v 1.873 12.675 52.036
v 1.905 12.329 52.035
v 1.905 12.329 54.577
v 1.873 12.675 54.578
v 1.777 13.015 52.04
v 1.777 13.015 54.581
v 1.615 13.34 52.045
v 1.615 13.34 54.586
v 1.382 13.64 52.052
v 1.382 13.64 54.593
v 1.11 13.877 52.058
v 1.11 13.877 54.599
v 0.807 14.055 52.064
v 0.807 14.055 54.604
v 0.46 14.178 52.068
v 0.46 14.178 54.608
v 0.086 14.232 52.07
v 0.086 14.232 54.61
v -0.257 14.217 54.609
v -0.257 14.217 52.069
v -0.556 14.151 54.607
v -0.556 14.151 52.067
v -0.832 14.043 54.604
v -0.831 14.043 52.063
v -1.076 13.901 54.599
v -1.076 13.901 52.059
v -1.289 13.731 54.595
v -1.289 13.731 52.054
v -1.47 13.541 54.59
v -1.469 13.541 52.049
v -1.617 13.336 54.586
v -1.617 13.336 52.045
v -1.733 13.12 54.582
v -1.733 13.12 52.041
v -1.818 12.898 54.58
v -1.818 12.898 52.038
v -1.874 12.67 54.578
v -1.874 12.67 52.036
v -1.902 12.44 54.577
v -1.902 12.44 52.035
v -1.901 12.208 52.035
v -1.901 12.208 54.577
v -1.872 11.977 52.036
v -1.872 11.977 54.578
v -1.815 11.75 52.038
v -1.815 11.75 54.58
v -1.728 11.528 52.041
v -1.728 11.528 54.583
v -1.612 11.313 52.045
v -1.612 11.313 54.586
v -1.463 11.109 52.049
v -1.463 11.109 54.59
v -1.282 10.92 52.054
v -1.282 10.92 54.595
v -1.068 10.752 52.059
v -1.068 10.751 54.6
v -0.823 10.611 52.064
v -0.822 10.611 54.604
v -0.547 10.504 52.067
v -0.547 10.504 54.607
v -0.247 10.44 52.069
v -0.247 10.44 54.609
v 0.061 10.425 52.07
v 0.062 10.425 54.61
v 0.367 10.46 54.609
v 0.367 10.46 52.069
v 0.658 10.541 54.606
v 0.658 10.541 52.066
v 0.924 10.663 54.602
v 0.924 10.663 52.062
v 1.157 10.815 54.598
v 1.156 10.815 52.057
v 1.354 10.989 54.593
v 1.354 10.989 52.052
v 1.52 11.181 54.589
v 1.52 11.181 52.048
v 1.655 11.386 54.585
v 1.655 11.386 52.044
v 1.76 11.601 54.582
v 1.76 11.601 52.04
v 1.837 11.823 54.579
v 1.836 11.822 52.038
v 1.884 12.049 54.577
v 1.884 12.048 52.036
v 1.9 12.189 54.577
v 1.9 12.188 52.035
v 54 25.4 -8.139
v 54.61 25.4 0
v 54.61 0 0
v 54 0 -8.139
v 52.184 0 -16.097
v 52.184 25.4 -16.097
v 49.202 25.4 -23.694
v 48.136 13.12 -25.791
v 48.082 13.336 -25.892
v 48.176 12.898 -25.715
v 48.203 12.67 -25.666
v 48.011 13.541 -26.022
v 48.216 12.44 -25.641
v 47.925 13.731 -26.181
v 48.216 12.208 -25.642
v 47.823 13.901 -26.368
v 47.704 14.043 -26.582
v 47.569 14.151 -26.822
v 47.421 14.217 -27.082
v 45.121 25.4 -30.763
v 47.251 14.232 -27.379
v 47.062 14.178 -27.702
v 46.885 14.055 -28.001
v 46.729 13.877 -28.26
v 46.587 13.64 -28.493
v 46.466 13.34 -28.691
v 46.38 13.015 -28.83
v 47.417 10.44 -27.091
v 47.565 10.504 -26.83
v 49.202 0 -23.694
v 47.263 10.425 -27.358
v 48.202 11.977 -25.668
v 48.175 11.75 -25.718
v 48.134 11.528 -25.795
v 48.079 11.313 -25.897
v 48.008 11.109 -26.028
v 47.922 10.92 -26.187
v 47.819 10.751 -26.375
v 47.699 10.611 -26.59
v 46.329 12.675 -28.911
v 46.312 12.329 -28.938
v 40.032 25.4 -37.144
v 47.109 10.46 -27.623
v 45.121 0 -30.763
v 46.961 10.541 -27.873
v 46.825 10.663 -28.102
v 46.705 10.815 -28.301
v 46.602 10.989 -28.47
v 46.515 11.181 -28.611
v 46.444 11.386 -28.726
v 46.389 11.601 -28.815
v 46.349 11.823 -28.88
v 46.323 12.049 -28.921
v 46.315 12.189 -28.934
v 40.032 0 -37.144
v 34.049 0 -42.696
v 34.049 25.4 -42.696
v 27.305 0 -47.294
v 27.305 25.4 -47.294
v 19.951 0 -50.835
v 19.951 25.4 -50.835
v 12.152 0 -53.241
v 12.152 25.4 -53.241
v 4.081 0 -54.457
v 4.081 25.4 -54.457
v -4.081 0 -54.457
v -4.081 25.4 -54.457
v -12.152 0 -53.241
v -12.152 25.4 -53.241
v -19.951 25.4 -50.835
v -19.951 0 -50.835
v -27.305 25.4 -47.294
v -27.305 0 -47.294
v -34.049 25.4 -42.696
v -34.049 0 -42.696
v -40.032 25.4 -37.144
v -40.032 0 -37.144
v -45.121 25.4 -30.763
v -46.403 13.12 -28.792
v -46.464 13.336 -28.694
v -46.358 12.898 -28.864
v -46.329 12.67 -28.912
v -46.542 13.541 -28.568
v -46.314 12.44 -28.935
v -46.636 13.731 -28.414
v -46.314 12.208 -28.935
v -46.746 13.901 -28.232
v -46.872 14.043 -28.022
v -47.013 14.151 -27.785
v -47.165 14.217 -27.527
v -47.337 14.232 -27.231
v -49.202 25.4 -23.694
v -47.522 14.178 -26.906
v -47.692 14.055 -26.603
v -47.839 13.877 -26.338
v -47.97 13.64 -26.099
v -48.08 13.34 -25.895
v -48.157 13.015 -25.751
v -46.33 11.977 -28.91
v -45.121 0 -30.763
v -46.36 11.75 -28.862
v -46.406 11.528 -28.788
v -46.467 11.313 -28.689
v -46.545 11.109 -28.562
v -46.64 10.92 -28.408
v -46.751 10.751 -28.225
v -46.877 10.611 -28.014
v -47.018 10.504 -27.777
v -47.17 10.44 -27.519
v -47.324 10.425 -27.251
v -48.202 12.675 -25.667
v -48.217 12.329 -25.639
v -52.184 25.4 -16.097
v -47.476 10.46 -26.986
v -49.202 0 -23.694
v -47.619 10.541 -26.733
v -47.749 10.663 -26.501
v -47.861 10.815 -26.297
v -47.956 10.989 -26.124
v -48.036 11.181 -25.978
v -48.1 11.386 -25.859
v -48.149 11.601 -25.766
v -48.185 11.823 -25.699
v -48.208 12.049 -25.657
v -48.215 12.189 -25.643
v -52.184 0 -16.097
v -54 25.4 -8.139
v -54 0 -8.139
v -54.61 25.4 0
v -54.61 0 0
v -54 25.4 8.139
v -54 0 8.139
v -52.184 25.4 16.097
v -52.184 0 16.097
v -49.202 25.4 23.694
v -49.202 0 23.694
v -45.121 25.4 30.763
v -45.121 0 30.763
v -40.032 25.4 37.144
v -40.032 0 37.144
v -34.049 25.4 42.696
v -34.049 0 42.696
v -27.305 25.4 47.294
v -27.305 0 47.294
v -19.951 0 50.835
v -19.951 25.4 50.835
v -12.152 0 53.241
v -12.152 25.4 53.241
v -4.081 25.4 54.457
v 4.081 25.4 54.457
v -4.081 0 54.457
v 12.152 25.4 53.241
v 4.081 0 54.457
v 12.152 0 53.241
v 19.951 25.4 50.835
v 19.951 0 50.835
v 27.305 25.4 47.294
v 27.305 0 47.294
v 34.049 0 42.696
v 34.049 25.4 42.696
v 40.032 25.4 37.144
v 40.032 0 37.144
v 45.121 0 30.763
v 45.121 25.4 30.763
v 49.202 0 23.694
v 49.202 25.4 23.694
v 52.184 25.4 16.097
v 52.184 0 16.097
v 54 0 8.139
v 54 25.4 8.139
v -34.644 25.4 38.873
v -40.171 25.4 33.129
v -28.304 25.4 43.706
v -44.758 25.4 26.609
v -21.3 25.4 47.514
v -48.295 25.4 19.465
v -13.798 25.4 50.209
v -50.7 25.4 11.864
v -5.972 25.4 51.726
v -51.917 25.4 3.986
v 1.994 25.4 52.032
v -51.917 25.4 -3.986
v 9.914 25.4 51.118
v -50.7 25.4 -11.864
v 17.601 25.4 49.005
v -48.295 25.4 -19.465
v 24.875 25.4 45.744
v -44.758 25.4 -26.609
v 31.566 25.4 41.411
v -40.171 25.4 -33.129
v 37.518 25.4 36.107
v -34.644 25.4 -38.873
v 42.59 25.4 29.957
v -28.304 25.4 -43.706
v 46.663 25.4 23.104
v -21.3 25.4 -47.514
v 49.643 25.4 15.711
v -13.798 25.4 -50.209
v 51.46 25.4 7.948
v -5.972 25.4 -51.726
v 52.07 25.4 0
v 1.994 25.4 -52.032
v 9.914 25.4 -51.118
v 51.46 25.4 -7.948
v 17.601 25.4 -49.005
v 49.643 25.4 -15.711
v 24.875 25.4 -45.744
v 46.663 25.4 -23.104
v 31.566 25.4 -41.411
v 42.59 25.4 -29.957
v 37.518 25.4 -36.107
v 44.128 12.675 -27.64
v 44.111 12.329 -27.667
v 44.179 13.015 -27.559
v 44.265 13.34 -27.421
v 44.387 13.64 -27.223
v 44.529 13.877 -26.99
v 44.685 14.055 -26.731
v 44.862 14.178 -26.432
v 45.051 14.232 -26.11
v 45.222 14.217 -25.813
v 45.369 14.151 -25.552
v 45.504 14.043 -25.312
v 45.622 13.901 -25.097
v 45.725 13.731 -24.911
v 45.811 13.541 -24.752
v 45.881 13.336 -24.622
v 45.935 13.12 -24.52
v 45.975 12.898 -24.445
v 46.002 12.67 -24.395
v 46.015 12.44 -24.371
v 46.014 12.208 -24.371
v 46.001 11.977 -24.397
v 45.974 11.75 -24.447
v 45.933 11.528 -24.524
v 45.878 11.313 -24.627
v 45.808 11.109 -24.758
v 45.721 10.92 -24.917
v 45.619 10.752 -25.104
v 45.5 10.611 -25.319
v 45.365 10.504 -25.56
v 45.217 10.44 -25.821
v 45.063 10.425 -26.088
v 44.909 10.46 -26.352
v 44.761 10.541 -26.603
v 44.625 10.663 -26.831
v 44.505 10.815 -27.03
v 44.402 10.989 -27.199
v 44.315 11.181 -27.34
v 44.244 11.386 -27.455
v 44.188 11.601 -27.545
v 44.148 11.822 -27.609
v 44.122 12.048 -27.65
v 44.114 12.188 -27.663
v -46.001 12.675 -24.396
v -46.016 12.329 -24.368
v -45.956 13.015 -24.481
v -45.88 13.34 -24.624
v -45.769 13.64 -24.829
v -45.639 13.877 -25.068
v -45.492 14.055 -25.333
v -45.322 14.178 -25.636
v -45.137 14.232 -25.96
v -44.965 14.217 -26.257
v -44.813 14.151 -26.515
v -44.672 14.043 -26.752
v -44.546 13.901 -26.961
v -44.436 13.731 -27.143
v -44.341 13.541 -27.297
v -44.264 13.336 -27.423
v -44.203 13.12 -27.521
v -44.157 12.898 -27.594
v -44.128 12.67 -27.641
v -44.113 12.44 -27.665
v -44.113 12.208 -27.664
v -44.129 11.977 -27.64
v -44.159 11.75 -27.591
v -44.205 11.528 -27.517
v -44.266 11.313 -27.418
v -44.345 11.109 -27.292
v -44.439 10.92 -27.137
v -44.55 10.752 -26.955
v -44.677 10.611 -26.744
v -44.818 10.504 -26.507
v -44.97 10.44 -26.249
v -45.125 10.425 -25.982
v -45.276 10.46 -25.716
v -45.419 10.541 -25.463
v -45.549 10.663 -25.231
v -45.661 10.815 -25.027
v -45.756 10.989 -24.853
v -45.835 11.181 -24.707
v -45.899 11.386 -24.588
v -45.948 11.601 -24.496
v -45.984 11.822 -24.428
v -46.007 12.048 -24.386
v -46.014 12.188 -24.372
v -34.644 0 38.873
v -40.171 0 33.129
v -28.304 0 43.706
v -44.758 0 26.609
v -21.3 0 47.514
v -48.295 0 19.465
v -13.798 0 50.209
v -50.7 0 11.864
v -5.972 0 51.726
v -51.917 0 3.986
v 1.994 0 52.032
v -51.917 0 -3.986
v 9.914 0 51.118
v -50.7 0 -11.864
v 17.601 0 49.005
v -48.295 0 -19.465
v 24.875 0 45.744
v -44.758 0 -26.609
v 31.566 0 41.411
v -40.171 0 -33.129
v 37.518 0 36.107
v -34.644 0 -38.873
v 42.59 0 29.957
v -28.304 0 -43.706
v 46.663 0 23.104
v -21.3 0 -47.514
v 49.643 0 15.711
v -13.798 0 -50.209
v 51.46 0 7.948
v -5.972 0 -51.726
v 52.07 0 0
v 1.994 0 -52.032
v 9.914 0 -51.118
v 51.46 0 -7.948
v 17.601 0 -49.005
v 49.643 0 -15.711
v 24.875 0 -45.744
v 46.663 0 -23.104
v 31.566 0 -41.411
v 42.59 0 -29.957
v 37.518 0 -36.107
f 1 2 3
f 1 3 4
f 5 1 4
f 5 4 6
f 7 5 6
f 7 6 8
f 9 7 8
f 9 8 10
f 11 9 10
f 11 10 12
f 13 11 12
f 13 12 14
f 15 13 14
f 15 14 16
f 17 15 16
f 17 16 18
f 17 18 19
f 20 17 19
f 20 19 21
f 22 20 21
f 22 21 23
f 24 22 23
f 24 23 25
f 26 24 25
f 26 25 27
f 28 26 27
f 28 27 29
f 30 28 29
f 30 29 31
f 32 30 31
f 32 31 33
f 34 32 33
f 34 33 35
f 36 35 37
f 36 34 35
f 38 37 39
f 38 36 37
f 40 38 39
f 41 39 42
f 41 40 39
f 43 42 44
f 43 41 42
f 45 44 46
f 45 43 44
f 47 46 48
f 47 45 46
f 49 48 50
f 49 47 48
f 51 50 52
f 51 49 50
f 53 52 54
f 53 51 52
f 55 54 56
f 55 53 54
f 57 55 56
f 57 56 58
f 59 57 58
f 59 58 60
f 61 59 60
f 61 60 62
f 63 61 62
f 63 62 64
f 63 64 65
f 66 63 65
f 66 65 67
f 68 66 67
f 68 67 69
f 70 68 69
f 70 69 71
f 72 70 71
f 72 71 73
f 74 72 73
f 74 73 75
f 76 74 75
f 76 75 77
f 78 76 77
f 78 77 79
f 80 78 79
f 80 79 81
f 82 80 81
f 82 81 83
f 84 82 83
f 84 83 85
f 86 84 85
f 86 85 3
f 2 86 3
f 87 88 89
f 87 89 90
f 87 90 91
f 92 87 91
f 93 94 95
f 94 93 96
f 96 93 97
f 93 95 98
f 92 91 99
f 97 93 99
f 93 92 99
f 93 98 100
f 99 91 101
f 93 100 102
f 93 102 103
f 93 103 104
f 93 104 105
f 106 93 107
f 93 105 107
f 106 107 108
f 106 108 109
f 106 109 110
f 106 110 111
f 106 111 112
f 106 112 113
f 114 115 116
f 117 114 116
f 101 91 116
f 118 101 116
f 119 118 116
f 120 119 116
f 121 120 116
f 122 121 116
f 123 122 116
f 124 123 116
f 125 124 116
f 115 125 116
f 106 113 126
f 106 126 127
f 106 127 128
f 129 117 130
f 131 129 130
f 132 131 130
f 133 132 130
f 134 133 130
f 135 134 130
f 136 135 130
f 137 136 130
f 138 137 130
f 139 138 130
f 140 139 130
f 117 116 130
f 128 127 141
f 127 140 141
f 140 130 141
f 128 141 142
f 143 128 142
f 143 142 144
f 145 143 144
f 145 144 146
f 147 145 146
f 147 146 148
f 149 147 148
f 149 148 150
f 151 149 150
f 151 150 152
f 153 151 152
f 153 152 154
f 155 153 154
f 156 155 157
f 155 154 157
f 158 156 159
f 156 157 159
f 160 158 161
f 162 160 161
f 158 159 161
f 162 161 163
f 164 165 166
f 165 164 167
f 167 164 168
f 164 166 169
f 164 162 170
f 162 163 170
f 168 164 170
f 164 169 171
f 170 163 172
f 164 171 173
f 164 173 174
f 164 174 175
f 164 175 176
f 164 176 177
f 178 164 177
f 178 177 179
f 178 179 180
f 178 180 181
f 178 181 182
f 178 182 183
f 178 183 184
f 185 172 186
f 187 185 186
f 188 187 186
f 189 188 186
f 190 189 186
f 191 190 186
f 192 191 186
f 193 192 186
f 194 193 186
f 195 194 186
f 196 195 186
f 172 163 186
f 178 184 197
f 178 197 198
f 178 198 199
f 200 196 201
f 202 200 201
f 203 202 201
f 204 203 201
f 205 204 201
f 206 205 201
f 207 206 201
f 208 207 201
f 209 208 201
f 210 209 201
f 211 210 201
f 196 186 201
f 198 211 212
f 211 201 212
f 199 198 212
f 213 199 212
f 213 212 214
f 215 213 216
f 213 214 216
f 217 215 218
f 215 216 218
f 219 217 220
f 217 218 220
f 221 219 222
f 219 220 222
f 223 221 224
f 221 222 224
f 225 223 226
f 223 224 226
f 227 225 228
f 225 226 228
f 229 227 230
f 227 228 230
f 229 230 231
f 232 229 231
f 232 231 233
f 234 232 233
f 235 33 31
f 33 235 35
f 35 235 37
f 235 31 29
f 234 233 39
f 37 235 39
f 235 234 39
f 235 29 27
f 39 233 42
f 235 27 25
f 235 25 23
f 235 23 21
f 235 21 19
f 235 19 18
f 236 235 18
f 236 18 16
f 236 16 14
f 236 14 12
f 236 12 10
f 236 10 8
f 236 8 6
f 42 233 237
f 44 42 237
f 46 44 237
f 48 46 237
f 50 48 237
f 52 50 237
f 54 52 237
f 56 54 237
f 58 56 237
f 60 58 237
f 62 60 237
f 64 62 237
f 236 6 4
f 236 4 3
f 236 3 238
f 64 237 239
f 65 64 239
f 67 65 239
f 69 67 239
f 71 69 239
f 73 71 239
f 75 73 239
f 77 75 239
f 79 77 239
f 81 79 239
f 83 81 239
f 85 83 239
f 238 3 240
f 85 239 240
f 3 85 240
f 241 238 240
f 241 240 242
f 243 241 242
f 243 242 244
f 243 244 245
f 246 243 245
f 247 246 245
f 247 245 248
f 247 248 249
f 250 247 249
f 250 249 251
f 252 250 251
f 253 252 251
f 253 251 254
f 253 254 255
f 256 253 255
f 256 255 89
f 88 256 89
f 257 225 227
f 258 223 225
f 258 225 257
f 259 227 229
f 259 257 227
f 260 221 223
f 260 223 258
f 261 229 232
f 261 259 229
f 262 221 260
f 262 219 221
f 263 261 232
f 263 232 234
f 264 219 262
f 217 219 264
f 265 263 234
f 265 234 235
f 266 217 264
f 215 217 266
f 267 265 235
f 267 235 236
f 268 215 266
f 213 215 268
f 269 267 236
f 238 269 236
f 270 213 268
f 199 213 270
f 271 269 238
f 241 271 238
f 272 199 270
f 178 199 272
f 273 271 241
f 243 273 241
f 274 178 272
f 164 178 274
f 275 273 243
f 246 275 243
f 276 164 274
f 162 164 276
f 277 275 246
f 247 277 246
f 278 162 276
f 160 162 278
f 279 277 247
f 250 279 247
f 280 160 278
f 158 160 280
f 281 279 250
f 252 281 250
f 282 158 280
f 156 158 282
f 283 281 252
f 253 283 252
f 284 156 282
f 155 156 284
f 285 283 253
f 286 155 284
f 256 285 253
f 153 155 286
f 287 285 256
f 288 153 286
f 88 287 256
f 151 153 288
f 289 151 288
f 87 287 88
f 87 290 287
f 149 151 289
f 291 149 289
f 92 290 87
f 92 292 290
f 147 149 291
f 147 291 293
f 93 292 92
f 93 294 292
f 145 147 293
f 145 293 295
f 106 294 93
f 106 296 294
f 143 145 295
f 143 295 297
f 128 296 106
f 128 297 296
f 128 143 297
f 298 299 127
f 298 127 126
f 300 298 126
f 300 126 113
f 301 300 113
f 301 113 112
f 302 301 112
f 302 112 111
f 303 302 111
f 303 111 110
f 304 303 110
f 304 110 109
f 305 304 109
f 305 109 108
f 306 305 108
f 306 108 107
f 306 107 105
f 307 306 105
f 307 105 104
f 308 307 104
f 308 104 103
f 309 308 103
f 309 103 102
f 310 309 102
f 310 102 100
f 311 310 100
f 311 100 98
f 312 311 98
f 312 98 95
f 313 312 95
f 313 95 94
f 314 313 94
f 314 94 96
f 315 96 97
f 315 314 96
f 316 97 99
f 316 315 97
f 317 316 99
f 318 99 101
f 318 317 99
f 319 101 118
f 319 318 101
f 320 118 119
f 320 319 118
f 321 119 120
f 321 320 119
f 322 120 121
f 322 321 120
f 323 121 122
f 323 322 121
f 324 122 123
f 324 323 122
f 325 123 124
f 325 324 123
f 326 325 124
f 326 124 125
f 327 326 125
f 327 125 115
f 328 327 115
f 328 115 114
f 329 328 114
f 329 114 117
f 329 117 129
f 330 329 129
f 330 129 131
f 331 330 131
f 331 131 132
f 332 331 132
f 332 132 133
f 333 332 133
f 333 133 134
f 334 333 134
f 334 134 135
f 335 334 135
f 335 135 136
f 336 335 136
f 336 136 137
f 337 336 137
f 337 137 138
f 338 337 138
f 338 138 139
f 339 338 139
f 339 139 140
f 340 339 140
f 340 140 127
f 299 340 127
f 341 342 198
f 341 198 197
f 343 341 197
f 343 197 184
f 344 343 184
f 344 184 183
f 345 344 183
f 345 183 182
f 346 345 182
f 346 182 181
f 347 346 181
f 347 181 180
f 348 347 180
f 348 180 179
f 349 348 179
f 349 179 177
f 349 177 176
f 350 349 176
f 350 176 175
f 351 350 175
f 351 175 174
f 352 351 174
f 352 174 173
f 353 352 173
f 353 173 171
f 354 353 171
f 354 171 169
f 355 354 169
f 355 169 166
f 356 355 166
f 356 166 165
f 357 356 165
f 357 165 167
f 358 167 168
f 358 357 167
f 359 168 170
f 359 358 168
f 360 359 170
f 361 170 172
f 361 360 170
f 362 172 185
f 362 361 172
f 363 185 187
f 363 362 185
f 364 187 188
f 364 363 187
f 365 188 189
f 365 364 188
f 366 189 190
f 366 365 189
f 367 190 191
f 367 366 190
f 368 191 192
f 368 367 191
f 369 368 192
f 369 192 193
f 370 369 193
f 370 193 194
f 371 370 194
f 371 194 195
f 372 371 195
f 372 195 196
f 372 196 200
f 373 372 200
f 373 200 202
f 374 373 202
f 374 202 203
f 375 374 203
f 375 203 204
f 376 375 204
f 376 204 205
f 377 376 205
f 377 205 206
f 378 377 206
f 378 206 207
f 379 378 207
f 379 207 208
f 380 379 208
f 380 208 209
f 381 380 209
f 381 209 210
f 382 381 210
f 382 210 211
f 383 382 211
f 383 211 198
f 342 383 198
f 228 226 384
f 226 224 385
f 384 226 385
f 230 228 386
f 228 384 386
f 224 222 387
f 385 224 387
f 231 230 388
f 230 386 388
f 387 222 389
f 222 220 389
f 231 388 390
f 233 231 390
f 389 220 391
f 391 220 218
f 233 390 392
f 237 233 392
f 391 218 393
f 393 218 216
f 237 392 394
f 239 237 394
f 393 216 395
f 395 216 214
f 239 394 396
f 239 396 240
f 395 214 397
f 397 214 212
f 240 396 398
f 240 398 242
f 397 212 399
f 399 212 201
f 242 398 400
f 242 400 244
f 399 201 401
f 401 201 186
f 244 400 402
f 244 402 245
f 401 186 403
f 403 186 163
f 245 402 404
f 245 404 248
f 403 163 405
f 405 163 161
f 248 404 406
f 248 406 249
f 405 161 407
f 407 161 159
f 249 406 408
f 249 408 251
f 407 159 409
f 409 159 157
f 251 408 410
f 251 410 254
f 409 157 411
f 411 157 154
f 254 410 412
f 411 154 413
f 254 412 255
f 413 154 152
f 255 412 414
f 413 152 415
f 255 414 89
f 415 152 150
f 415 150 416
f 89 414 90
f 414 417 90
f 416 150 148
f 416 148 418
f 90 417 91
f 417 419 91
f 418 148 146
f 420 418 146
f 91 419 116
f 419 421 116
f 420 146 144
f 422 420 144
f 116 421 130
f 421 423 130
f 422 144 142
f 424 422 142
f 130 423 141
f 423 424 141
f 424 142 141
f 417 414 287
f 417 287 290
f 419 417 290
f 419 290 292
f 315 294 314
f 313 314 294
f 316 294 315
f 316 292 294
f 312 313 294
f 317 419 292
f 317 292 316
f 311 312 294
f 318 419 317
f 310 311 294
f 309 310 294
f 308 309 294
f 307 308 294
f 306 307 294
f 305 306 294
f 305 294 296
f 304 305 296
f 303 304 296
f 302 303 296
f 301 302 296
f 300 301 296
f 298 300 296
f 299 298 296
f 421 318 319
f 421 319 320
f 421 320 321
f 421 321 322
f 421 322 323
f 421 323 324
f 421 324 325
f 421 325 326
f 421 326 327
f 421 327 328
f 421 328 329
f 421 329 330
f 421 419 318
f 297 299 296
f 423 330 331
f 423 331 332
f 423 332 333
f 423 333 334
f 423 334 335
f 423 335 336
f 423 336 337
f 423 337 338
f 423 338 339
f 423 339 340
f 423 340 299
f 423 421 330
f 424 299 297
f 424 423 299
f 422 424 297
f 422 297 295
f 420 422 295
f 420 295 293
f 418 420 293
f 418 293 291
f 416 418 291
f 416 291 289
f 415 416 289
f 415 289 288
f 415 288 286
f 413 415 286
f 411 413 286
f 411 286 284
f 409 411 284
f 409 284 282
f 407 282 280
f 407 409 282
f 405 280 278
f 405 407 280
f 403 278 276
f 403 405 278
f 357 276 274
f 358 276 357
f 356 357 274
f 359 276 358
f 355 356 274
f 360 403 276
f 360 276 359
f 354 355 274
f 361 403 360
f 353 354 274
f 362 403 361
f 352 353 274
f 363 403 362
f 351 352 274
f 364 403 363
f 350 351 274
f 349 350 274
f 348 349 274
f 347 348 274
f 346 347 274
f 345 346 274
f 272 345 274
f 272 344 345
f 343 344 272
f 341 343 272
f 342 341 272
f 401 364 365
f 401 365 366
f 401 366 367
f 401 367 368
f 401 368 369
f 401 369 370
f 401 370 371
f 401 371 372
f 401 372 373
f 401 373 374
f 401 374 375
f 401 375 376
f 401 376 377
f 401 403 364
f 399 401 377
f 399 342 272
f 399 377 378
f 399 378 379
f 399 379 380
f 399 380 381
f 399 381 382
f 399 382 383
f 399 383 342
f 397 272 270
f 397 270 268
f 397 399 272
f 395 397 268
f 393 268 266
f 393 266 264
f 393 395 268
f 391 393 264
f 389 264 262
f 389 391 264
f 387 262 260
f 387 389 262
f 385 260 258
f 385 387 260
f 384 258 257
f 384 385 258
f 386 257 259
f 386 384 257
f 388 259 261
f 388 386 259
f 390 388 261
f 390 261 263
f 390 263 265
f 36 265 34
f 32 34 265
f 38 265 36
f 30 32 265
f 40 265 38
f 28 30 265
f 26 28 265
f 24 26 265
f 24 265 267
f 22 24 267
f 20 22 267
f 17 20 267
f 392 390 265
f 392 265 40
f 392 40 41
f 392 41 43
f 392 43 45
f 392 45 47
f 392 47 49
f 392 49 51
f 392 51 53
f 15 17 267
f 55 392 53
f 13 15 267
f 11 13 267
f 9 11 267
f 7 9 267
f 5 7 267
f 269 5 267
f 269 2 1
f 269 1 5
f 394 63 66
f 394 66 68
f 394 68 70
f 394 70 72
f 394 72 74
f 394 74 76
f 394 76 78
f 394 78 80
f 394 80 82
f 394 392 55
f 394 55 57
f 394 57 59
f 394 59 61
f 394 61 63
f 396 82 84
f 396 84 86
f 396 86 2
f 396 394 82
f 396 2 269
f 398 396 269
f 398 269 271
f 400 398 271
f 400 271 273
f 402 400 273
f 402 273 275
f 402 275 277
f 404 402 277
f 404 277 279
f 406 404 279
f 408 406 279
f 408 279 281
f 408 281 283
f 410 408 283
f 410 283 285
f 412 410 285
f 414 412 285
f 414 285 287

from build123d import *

# Parameters (mm, degrees)
SKETCH1_R           = 54.61
SKETCH1_R_2         = 52.07
BOSS_EXTRUDE1_DEPTH = 25.4
SKETCH3_R           = 1.905
CUT_EXTRUDE1_DEPTH  = 55.61
CIRPATTERN1_COUNT   = 3


with BuildPart() as part:
    # Sketch1 → Boss-Extrude1 (new body)
    with BuildSketch(Plane(origin=(0, 0, 0), x_dir=(1, 0, 0), z_dir=(0, 1, 0))):
        Circle(SKETCH1_R)
        Circle(SKETCH1_R_2, mode=Mode.SUBTRACT)
    extrude(amount=BOSS_EXTRUDE1_DEPTH)

    # Sketch3 → Cut-Extrude1 (cut, through all)
    with BuildSketch(Plane.XY):
        with Locations((0, 12.328955527)):
            Circle(SKETCH3_R)
    cut_extrude1 = extrude(amount=CUT_EXTRUDE1_DEPTH, mode=Mode.SUBTRACT)

    # CirPattern1: Cut-Extrude1 ×3 about axis
    cirpattern1_axis = Axis((0, 25.4, 0), (0, 1, 0))
    for i in range(1, CIRPATTERN1_COUNT):
        add(cut_extrude1.rotate(cirpattern1_axis, i * 360 / CIRPATTERN1_COUNT), mode=Mode.SUBTRACT)


solid = part.part
